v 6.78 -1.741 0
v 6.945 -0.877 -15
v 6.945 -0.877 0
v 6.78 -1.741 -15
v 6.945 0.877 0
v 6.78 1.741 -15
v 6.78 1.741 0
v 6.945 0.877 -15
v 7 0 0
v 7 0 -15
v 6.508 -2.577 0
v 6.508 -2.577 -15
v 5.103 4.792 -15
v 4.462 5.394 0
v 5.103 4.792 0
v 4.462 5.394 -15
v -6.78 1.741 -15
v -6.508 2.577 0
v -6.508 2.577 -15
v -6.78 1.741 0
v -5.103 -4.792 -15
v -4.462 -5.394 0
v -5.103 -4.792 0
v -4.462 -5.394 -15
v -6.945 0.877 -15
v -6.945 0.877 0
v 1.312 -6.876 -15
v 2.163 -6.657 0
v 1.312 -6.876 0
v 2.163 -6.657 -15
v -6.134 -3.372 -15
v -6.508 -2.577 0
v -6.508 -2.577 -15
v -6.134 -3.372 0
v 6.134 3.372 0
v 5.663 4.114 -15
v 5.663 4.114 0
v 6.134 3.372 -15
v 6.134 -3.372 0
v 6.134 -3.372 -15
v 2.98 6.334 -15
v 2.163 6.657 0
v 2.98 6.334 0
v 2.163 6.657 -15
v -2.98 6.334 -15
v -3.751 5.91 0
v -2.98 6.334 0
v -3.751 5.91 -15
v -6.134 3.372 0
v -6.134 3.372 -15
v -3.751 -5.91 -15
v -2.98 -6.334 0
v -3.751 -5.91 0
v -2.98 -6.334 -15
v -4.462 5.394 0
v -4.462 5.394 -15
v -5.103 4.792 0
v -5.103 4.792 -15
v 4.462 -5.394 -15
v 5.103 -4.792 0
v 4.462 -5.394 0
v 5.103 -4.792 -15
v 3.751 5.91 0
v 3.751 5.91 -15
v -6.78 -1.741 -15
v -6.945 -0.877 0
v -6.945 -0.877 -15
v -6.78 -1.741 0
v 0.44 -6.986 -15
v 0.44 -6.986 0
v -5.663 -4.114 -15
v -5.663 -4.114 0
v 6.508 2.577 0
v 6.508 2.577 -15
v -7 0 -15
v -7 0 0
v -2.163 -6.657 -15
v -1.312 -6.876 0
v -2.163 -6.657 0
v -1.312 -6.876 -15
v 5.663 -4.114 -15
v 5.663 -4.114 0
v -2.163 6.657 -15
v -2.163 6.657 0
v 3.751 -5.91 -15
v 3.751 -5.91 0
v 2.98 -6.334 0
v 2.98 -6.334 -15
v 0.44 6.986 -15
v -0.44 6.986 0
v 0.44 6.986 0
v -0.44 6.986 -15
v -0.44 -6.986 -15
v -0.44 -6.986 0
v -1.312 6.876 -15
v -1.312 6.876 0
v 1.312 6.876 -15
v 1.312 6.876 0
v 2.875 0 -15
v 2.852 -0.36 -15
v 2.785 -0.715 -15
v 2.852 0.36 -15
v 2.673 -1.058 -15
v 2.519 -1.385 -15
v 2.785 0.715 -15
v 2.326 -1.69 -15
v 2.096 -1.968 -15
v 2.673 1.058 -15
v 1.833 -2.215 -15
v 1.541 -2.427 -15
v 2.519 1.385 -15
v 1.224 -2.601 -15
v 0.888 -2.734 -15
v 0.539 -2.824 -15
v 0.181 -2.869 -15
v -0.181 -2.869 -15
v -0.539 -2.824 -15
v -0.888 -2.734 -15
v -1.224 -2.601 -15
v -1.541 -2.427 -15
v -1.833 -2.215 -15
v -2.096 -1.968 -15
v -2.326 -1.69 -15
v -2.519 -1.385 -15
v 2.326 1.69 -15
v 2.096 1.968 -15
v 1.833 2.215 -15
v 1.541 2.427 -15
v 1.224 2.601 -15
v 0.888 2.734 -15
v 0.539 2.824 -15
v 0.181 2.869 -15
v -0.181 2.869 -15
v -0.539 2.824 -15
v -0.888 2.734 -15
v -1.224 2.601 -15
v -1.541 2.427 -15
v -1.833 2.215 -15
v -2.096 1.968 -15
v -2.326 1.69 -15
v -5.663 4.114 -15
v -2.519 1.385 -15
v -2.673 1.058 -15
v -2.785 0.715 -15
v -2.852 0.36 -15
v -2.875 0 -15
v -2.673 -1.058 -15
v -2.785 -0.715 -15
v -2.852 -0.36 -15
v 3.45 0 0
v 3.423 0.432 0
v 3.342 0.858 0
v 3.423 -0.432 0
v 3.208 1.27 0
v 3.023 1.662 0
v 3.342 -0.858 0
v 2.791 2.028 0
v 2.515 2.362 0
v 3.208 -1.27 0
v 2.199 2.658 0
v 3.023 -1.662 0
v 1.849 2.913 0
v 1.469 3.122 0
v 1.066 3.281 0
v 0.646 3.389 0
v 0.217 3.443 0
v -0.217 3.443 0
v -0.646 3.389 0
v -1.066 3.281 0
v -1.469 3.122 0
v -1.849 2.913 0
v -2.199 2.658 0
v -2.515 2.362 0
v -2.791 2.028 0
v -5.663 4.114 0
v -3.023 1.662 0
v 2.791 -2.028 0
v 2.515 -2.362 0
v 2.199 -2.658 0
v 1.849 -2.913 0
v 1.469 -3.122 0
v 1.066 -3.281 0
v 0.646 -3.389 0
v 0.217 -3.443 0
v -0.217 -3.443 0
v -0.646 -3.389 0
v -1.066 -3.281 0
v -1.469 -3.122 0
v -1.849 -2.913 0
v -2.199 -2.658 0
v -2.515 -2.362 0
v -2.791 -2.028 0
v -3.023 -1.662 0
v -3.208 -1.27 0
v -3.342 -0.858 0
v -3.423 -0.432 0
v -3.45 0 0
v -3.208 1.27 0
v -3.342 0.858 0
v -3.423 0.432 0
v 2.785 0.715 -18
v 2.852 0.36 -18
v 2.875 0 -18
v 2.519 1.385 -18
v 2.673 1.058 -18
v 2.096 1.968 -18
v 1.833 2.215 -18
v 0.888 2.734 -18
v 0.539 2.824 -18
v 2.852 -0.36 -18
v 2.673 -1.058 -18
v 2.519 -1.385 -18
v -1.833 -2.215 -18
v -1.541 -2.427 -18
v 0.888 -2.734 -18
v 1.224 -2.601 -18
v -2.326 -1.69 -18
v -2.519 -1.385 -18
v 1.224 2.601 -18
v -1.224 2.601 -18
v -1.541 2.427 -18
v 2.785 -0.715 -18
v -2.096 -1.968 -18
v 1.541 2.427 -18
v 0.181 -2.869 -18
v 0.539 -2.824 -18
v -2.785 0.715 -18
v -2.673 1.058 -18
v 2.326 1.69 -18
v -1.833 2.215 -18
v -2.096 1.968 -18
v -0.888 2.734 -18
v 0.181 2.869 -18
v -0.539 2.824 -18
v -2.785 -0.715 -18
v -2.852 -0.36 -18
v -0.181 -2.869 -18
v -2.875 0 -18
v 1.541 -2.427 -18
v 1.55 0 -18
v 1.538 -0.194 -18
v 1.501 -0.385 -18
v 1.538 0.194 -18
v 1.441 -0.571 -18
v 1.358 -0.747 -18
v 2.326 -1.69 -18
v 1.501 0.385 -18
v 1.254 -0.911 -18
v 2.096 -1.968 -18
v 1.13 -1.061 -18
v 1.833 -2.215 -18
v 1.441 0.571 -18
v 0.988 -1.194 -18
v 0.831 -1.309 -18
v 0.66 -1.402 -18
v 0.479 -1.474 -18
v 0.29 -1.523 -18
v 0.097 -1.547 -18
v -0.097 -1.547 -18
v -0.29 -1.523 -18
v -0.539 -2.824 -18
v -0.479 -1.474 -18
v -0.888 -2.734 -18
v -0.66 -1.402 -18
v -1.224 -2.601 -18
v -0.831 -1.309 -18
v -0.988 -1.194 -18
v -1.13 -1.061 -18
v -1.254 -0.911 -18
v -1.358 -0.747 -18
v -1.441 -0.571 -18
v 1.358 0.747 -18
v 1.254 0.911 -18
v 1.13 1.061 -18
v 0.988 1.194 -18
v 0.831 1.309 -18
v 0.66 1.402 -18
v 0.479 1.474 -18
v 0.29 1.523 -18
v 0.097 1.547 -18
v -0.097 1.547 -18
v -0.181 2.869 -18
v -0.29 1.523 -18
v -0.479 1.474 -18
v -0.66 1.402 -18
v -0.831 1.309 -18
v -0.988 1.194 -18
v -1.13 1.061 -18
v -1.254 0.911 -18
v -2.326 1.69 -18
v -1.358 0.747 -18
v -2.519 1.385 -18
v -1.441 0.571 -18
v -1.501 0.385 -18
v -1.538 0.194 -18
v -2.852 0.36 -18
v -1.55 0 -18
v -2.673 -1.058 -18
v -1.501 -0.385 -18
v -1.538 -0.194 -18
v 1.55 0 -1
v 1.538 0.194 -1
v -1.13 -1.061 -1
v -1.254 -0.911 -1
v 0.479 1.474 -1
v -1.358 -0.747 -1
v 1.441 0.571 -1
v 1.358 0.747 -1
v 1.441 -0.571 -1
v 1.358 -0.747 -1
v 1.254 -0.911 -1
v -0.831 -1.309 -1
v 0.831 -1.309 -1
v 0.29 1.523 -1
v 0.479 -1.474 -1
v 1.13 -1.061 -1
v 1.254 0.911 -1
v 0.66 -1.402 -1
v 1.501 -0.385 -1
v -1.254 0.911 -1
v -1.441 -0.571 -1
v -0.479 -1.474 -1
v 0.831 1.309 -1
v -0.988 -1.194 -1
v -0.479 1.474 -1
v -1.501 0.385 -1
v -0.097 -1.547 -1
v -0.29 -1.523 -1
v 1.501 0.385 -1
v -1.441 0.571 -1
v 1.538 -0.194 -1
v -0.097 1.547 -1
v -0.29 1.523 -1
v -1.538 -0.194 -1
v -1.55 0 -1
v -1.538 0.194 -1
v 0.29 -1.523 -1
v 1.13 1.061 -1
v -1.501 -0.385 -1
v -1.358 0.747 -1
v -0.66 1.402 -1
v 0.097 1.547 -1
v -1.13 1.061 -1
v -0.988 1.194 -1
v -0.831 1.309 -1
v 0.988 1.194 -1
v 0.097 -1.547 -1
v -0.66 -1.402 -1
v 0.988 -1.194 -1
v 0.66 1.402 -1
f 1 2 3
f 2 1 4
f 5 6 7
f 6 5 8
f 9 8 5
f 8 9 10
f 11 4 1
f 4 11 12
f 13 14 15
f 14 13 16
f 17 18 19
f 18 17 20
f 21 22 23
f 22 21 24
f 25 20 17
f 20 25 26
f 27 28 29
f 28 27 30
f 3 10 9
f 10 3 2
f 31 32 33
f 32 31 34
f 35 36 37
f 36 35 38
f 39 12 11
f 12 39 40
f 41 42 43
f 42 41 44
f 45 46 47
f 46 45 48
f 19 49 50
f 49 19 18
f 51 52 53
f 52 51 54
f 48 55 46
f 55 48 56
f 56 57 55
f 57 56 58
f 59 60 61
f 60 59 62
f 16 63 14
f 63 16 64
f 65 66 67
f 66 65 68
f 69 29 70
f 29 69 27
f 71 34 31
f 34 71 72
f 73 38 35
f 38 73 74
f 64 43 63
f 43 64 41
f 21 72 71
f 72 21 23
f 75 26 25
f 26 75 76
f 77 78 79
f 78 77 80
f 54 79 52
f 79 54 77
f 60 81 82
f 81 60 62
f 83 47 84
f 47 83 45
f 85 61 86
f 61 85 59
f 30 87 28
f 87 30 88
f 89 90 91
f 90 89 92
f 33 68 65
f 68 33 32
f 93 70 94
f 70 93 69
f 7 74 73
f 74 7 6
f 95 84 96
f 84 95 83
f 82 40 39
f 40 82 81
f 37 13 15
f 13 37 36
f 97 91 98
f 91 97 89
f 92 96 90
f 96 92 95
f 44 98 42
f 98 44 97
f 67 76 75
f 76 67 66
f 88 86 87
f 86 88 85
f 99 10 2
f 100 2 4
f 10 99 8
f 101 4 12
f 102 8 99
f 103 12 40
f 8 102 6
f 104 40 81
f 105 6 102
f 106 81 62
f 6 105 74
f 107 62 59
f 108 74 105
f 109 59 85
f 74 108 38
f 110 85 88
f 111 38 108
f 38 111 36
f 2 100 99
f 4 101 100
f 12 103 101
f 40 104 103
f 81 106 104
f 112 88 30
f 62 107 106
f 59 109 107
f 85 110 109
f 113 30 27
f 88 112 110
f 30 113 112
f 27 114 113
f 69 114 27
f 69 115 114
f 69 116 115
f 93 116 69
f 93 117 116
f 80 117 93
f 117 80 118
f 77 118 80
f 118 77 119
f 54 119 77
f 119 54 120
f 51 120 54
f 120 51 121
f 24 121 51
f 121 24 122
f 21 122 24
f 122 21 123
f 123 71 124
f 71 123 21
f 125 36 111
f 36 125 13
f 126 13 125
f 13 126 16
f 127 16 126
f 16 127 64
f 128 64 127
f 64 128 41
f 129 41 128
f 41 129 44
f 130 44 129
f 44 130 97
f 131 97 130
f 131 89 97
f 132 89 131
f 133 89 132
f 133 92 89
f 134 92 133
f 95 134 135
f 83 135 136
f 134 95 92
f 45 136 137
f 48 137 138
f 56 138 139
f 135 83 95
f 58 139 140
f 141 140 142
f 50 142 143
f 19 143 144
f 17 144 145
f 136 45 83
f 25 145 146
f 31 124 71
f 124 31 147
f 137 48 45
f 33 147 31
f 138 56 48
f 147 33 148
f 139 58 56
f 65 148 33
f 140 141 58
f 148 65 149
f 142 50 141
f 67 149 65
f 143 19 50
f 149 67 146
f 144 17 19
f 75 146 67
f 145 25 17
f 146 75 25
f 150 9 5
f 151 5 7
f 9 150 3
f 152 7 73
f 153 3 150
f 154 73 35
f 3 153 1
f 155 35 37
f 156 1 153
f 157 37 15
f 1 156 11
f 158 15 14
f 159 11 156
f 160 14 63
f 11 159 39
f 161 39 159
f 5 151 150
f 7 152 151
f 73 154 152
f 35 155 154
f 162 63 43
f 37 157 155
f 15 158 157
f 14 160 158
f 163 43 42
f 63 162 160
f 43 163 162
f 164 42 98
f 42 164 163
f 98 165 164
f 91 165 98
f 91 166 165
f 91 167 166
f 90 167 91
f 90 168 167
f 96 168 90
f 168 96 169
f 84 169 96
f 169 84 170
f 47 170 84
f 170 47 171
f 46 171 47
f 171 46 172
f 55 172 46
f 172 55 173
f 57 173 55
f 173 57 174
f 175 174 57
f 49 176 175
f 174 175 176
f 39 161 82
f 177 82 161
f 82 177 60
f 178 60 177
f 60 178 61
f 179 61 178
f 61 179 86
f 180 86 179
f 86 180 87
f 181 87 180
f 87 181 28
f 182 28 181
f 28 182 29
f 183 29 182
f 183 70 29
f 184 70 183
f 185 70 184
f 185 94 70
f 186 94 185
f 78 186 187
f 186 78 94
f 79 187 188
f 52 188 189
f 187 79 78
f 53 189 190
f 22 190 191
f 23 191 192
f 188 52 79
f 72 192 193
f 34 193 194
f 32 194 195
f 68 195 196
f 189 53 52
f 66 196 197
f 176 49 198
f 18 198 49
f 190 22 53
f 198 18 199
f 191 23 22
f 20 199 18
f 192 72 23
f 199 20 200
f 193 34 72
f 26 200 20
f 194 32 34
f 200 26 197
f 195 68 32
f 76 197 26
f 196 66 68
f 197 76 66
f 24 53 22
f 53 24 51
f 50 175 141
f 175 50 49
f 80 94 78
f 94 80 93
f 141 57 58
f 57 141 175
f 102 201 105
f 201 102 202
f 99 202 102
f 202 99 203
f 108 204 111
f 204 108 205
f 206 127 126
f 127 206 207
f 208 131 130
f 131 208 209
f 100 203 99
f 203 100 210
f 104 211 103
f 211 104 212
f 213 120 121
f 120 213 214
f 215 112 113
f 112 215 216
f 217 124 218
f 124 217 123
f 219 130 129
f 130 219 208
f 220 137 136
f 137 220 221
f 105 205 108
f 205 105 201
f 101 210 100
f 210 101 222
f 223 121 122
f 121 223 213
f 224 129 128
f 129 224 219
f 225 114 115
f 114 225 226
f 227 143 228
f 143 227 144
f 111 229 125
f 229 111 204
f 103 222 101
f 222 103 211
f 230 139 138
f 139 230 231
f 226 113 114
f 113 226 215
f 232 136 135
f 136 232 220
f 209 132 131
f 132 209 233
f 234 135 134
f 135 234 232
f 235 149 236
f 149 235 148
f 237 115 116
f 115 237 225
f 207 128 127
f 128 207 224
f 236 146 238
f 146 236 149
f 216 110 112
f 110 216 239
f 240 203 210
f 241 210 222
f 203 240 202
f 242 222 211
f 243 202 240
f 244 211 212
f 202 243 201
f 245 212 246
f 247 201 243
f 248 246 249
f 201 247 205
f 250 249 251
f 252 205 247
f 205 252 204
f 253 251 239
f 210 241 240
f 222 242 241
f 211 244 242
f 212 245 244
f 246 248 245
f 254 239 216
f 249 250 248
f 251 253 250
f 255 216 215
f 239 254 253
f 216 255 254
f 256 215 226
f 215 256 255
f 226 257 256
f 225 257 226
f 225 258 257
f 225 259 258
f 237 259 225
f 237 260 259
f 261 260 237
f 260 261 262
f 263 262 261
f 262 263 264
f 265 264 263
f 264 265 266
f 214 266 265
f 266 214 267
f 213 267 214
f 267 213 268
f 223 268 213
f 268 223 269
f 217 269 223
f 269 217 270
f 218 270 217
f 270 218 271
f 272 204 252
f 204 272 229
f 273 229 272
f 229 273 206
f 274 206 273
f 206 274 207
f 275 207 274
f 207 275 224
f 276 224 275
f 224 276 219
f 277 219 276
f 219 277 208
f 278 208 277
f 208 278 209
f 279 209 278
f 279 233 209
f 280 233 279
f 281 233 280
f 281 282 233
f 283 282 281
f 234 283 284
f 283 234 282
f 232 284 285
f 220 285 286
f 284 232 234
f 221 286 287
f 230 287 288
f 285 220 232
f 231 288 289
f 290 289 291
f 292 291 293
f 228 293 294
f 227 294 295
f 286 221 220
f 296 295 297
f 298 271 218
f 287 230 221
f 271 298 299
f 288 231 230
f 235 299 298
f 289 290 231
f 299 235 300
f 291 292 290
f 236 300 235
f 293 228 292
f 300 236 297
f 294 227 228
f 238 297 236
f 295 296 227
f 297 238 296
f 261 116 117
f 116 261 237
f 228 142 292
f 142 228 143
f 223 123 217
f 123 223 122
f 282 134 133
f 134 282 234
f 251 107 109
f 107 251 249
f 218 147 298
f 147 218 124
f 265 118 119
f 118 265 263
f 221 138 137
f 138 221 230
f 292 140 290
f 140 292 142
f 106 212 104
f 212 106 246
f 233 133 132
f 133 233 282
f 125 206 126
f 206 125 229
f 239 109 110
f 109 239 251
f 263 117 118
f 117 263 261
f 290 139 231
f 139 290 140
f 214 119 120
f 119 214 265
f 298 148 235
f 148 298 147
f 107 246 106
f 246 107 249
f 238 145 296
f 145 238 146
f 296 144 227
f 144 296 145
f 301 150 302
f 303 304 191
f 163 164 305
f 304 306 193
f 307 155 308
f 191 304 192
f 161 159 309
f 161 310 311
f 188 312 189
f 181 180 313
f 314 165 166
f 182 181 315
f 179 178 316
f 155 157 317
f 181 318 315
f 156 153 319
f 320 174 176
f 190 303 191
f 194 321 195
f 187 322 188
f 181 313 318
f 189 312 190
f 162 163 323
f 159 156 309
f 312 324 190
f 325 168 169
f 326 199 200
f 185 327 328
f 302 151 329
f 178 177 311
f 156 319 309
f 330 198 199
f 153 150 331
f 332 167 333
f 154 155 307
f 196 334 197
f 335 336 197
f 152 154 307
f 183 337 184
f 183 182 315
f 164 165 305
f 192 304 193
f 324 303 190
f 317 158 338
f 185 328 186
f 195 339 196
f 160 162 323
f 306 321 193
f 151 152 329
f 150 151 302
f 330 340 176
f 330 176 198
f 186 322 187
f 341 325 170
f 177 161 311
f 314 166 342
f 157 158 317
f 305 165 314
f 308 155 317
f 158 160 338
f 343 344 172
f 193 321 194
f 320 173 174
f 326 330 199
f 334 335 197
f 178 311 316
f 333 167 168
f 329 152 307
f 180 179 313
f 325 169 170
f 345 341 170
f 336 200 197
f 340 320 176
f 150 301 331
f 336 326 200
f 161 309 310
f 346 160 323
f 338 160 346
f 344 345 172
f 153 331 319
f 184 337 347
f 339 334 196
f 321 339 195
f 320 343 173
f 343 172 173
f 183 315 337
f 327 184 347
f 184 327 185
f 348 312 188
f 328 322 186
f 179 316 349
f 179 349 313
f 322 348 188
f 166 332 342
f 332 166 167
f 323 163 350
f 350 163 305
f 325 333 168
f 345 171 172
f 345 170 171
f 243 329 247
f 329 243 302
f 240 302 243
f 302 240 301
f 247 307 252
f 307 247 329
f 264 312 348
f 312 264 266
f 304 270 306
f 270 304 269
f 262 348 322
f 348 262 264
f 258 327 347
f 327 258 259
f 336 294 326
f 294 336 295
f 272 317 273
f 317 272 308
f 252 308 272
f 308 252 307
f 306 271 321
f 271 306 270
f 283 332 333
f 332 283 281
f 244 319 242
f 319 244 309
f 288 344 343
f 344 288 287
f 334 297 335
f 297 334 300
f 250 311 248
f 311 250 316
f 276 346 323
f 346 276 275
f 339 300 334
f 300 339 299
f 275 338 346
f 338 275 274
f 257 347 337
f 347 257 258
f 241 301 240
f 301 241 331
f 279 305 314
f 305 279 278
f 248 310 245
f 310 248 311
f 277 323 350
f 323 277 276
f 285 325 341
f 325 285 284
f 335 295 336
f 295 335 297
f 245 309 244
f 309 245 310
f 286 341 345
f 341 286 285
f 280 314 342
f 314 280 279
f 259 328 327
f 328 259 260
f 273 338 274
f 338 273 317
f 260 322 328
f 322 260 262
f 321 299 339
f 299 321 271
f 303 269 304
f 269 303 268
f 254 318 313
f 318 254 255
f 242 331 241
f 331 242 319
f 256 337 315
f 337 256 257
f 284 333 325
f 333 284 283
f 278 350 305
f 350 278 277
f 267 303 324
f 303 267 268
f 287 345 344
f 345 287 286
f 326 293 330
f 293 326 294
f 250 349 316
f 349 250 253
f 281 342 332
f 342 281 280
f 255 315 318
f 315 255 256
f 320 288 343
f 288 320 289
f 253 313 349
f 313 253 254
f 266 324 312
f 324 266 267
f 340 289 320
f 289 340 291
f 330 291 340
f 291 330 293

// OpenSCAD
$fn = 50;

difference() {
	union() {
		translate(v = [0, 0, -15.0]) {
			cylinder(h = 15, r = 7.0);
		}
		#translate(v = [0, 0, -18.0]) {
			cylinder(h = 18, r = 2.875);
		}
	}
	union() {
		translate(v = [0, 0, 0]) {
			rotate(a = [0, 0, 0]) {
				difference() {
					union() {
						translate(v = [0, 0, -18.0]) {
							cylinder(h = 18, r = 1.25);
						}
						translate(v = [0, 0, -1.0]) {
							cylinder(h = 1.0, r1 = 1.55, r2 = 3.45);
						}
						translate(v = [0, 0, -18.0]) {
							cylinder(h = 18, r = 1.55);
						}
						translate(v = [0, 0, -18.0]) {
							cylinder(h = 18, r = 1.25);
						}
					}
					union();
				}
			}
		}
	}
}
